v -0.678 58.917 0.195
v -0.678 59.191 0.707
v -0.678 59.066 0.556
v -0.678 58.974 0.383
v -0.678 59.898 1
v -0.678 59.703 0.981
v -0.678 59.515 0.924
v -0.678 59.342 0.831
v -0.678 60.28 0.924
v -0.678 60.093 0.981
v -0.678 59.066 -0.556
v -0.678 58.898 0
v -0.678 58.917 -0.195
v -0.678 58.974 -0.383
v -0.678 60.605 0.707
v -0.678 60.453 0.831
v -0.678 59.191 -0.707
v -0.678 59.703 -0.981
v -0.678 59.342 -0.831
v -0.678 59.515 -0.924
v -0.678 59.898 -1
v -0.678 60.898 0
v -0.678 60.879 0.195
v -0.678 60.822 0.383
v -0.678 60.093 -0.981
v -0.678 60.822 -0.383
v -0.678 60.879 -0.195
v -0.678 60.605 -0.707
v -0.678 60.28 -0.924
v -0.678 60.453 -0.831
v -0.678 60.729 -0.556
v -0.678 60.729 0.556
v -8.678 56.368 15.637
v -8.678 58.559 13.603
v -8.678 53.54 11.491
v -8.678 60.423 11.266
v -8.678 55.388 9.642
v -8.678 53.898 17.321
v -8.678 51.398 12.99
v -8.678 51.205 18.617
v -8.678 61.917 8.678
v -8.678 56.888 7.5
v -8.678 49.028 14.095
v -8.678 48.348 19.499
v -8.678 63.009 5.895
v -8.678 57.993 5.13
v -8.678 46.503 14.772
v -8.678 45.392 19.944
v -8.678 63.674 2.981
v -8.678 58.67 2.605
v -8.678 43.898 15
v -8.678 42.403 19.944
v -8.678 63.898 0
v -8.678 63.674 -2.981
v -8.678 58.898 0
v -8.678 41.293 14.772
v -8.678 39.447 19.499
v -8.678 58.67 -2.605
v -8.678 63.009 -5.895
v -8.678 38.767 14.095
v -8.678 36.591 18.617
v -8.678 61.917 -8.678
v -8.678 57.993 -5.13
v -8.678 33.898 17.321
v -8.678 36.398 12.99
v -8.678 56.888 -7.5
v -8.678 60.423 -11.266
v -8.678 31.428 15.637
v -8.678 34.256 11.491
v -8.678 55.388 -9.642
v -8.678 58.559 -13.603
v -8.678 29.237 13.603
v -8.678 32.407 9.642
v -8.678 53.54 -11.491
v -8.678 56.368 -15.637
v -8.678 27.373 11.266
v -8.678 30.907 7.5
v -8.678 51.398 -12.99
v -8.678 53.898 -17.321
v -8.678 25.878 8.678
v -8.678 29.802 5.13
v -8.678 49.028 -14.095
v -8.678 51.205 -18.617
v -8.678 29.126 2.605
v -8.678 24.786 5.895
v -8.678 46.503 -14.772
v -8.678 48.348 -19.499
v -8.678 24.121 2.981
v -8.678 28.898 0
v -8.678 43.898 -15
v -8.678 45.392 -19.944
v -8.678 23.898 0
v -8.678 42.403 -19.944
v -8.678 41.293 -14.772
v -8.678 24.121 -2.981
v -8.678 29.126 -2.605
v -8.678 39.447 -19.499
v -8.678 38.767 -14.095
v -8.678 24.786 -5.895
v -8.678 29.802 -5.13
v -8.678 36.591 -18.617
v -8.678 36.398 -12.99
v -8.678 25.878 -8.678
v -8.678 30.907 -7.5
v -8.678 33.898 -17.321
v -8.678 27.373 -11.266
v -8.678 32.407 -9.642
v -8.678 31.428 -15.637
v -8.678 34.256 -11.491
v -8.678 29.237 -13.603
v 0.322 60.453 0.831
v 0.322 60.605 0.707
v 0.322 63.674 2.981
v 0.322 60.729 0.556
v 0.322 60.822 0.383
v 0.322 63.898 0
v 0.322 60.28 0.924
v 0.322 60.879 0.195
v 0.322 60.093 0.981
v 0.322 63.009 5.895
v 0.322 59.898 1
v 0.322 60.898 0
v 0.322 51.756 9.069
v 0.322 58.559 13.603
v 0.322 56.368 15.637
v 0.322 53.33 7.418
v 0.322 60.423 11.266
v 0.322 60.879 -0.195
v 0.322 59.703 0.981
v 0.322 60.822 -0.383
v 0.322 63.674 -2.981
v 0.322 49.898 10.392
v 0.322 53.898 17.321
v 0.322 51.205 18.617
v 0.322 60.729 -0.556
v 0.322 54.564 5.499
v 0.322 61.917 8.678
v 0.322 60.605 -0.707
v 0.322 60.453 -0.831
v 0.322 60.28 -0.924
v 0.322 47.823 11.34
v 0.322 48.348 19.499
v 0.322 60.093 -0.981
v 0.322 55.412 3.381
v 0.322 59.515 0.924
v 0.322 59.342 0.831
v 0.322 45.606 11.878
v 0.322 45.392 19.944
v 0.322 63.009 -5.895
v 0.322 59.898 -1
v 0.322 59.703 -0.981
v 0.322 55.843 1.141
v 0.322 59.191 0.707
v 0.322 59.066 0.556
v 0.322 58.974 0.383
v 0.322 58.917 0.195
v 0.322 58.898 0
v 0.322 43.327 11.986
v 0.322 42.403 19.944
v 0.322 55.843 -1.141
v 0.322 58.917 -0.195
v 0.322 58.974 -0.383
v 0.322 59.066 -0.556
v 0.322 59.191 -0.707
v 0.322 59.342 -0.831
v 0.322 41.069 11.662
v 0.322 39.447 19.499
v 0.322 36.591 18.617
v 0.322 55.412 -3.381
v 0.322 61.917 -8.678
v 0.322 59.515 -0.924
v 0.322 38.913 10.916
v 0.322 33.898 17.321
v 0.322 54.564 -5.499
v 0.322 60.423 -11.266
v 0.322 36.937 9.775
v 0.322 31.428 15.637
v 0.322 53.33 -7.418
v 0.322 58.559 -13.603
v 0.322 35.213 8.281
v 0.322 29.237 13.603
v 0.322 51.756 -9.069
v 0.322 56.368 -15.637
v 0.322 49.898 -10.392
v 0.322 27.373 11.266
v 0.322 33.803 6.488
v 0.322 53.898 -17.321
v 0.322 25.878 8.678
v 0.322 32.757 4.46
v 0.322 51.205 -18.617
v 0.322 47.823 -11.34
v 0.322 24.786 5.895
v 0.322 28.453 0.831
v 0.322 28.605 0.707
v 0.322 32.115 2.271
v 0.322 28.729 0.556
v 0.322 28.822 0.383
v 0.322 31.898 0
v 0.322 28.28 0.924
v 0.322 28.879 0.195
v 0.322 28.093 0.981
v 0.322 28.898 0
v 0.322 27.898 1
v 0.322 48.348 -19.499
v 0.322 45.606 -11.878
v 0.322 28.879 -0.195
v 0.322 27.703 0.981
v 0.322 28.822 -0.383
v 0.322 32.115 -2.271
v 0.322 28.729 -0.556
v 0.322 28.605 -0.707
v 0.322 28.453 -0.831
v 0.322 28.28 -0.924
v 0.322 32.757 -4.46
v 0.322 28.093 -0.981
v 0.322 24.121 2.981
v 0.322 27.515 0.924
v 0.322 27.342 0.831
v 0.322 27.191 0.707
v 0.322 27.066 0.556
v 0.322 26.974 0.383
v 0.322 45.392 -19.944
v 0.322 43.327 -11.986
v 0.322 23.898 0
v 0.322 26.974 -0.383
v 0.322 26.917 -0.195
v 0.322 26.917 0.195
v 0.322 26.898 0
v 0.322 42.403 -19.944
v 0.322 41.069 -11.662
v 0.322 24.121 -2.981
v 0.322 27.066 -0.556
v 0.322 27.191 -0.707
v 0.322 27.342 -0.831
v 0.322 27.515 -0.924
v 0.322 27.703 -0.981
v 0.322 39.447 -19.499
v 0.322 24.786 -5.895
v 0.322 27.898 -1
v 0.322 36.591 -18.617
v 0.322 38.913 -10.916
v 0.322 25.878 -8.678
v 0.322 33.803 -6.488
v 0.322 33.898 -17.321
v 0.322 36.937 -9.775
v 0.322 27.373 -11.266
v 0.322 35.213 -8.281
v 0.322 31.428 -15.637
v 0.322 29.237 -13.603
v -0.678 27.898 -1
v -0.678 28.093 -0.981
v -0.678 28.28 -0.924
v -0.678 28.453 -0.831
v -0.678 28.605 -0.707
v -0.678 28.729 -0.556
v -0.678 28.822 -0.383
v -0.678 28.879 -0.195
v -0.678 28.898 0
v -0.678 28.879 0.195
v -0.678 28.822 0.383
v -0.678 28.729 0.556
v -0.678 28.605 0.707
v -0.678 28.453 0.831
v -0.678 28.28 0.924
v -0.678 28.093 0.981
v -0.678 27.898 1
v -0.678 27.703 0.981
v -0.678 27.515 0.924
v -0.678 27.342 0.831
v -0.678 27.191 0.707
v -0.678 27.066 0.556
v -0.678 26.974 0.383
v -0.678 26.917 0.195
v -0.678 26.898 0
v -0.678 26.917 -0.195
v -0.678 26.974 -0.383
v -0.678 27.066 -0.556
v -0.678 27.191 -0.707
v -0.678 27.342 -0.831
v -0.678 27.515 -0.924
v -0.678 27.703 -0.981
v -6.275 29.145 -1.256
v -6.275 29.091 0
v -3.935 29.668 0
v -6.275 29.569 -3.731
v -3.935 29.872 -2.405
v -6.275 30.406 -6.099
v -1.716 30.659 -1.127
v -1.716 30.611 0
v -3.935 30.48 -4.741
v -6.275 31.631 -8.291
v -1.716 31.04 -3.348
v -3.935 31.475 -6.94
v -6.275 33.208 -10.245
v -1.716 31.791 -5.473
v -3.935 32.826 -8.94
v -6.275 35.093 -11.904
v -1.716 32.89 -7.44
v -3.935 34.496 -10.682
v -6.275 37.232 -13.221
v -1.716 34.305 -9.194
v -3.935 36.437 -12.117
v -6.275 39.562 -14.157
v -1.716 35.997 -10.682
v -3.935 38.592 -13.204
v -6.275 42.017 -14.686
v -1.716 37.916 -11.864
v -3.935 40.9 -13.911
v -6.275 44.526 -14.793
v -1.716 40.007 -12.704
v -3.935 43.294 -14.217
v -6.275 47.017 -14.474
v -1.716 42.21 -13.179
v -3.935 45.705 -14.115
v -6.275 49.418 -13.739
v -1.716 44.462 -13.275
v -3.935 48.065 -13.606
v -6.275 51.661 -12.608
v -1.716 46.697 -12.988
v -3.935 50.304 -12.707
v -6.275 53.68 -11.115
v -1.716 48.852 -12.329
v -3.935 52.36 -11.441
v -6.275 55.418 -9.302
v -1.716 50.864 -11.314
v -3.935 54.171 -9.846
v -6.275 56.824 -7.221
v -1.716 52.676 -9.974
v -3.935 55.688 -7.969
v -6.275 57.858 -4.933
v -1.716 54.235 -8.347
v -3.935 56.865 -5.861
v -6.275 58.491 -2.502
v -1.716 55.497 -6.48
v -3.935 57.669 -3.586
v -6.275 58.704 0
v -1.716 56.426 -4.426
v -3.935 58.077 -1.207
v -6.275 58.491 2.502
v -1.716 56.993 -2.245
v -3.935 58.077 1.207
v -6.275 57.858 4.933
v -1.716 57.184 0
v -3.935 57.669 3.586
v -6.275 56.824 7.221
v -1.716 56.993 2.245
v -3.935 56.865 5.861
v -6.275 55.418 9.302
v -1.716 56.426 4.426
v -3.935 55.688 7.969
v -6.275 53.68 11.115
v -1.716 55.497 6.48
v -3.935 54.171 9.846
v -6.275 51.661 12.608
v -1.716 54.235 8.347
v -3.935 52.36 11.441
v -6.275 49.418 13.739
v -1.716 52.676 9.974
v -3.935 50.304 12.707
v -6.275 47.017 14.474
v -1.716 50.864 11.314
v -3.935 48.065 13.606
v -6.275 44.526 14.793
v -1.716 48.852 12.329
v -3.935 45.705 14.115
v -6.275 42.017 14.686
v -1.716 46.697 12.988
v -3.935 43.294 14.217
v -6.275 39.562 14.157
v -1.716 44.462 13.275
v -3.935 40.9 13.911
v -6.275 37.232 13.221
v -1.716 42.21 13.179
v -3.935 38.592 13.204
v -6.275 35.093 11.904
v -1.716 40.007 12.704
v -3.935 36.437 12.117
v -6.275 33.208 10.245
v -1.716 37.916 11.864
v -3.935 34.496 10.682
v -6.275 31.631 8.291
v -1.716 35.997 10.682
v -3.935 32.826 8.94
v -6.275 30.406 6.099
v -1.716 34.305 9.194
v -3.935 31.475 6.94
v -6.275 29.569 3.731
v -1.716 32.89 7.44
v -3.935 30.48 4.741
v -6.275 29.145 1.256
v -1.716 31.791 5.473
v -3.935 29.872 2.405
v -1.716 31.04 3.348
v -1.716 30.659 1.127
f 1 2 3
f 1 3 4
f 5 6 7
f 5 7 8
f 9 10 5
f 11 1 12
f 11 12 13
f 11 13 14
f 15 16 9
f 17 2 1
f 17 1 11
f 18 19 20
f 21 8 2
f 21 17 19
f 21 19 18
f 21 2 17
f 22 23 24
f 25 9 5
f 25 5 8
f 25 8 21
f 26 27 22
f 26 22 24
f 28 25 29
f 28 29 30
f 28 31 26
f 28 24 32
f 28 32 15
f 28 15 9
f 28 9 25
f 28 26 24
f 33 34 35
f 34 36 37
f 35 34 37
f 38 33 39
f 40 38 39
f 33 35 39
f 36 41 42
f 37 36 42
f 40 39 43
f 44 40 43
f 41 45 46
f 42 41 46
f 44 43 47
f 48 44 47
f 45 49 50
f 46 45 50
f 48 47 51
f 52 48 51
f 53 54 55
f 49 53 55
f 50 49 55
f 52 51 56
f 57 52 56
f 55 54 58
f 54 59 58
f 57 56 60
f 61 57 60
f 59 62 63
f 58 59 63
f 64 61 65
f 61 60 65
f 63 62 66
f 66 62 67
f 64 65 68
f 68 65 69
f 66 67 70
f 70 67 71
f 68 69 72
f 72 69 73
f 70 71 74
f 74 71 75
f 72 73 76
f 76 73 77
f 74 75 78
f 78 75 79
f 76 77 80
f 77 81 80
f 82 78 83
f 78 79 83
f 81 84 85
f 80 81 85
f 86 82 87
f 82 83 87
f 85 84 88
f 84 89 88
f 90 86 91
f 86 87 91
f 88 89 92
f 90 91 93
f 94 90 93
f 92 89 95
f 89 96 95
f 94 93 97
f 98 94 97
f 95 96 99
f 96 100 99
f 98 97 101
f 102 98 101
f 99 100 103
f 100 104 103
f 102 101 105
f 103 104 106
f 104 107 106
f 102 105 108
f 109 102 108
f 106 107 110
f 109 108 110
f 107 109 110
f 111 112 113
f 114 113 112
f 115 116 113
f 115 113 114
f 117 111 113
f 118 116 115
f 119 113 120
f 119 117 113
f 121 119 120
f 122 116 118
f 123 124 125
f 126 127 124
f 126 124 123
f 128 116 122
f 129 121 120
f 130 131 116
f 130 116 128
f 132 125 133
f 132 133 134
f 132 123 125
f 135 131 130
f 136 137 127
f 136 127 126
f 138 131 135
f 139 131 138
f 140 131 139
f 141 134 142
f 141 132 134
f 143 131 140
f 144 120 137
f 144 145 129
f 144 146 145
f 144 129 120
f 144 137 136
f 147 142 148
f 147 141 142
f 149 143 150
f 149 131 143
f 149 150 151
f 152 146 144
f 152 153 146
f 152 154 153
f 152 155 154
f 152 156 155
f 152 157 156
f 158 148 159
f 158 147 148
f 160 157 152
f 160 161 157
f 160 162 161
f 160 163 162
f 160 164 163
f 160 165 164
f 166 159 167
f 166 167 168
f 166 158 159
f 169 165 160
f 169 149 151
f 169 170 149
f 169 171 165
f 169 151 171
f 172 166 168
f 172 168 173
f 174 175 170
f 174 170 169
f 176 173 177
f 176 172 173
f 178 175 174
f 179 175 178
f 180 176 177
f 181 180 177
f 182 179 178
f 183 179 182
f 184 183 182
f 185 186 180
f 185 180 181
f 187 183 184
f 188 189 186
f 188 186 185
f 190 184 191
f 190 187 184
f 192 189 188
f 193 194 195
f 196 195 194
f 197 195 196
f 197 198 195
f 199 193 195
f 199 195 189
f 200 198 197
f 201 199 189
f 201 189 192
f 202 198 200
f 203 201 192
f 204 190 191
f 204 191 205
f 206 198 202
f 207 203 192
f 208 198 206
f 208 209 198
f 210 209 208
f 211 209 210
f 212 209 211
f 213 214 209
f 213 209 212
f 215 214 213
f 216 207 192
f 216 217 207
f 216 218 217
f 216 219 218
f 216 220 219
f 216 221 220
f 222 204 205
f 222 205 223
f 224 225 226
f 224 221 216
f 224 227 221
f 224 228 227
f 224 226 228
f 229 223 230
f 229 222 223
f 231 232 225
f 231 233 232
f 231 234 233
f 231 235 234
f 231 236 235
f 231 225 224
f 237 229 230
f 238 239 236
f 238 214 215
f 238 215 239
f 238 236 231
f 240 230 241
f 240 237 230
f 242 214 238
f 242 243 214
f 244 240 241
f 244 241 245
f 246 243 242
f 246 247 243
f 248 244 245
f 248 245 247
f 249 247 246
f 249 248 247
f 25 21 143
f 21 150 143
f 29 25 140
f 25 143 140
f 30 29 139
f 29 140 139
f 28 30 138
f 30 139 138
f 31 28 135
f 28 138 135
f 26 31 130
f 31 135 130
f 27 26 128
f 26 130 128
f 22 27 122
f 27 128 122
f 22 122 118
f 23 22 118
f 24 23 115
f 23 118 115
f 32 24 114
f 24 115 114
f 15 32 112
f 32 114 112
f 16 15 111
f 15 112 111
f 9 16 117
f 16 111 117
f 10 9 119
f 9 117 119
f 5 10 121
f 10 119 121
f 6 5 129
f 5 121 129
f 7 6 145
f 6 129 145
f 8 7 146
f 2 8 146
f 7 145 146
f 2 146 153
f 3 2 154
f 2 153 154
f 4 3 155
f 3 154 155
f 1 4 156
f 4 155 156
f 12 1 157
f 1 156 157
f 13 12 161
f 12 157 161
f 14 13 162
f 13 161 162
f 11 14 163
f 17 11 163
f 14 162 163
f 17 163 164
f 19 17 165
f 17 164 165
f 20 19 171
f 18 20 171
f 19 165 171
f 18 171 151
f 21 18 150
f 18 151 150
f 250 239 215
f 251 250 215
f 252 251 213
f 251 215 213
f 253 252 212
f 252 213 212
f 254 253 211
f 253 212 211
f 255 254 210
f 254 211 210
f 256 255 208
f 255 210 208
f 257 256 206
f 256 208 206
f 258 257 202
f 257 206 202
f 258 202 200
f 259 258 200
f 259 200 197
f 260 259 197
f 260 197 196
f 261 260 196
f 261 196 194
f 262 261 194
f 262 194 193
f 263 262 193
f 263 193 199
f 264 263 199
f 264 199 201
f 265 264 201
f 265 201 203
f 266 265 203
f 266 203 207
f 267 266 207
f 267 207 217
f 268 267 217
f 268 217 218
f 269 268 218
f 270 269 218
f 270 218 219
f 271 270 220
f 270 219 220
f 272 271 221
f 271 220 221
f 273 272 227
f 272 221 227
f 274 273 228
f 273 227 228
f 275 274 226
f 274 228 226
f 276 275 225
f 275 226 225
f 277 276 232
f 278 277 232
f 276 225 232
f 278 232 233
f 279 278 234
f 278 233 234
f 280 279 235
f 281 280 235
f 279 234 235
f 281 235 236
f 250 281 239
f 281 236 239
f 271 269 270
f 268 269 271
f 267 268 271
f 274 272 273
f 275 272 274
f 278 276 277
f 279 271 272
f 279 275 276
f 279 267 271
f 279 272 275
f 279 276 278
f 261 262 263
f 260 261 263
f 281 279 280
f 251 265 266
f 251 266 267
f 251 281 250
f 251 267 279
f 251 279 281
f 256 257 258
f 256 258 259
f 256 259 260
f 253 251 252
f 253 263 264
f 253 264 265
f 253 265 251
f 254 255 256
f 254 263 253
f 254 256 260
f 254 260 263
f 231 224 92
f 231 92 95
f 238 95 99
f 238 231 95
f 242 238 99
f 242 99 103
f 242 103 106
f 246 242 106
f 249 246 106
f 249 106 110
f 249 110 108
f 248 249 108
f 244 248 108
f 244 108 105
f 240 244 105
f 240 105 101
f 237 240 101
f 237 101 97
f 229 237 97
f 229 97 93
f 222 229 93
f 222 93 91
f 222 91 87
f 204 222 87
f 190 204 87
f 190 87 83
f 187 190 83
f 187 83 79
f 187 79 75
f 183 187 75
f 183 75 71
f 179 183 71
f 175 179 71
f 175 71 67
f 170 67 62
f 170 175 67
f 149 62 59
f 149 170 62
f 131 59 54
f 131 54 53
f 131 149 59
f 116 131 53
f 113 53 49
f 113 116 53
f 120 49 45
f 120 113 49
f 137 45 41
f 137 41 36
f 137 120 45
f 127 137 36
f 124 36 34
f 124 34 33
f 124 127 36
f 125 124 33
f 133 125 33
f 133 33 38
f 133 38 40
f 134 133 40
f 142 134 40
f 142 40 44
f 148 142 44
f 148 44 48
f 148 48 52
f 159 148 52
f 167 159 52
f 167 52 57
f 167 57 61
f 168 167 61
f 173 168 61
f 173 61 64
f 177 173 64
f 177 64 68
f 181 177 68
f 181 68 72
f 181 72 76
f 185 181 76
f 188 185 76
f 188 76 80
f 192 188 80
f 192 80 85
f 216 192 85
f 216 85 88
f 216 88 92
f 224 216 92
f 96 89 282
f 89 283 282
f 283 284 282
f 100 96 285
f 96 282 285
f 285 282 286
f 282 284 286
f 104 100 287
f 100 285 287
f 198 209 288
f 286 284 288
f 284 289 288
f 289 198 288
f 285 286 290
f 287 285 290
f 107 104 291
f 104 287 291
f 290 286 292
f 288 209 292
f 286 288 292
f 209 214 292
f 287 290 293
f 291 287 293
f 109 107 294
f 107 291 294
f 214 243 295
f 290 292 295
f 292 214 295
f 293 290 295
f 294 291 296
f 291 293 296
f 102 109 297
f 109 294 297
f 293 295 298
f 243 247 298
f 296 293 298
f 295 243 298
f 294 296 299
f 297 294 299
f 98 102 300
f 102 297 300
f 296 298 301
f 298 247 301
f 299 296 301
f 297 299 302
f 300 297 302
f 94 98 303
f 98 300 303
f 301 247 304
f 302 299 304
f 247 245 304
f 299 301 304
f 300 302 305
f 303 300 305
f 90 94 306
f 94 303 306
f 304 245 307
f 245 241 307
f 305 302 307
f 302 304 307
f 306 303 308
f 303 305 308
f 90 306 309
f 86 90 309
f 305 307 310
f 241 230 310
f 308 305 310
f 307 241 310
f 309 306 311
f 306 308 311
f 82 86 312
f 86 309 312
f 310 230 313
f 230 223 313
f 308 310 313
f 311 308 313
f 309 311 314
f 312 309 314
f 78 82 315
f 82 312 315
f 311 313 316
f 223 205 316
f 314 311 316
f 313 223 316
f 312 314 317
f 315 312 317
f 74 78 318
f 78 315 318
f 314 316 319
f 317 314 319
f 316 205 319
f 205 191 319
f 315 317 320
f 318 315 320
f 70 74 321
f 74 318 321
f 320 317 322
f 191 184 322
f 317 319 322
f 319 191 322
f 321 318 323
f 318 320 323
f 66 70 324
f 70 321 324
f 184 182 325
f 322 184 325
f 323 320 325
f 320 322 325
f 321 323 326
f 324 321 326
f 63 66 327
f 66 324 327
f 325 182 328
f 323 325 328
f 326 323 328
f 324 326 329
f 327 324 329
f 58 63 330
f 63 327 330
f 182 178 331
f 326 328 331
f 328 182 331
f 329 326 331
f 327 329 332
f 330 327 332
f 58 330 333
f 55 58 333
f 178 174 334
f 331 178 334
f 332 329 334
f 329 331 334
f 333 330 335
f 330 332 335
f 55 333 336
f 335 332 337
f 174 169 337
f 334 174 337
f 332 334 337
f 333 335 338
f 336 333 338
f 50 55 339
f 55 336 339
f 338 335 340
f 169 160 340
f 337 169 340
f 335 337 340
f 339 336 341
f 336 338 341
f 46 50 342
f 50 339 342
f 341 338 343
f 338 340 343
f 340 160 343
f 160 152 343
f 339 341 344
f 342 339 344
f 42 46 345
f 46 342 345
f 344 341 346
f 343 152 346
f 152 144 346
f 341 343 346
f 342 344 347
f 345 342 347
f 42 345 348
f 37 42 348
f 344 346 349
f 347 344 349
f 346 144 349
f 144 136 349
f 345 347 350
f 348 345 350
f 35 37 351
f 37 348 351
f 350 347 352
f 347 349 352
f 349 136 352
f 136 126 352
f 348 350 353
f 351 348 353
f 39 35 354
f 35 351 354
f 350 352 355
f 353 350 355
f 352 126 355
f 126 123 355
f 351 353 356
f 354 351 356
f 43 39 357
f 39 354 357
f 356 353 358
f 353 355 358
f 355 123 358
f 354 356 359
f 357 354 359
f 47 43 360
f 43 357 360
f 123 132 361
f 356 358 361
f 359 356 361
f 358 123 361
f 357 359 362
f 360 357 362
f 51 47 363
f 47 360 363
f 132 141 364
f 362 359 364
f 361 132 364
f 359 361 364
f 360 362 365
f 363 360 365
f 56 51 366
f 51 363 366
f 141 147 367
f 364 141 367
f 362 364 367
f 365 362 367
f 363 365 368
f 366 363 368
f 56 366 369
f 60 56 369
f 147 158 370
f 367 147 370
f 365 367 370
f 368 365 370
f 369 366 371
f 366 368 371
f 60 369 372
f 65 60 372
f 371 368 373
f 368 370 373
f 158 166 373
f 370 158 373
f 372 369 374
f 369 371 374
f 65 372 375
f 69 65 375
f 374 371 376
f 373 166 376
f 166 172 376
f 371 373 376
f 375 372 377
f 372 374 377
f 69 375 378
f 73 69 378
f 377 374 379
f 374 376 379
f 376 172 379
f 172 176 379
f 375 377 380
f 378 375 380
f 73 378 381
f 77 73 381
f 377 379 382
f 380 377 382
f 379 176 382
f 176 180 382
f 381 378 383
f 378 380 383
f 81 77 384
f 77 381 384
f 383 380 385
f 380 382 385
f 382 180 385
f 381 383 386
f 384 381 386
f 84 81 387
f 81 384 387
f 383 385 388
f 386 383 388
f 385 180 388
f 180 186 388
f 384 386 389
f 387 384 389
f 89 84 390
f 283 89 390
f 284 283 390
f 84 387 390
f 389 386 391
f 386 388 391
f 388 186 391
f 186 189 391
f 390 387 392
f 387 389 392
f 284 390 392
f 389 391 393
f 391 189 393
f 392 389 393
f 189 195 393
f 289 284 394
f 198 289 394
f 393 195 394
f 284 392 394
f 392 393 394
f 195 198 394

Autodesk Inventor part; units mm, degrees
ref_plane "YZ Plane" through (0, 0, 0) normal (1, 0, 0) x (0, 1, 0)
ref_plane "XZ Plane" through (0, 0, 0) normal (0, 1, 0) x (-1, 0, 0)
ref_plane "Work Plane1" through (0, 0, 0) normal (0, 0, 1) x (1, 0, 0)
sketch "Sketch1" plane through (0, 0, 0) normal (0, 0, 1) x (1, 0, 0)
  line L0 (-8.678, -58.5397) -> (-8.678, 43.8978) construction
  line L1 (1.322, -54.9064) -> (1.322, 43.8978) construction
  circle A0 centre (-8.678, 43.8978) radius 15 construction
  line L2 (-8.678, 23.8978) -> (1.322, 23.8978) construction
  line L3 (0.322, 23.8978) -> (0.322, 31.8978)
  line L4 (-8.678, 28.8978) -> (-8.678, 23.8978)
  line L5 (-8.678, 23.8978) -> (0.322, 23.8978)
  arc A1 (-8.678, 28.8978) -> (0.322, 31.8978) centre (-8.678, 43.8978) ccw
  line L6 (-8.678, 43.8978) -> (1.322, 43.8978) construction
  point P0 (0, 0)
  dimension "d0" = 1
revolve "Revolution1" add sketch "Sketch1" angle 360 about axis through (-8.678, 43.8978, 0) along (1, 0, 0)
thread "Thread2" size "M40x1.5" class "6g" standard "ISO Metric profile" length 9
sketch "Sketch9" plane through (0.322, 43.8978, 0) normal (1, 0, 0) x (0, 0, -1)
  circle A0 centre (0, 0) radius 12 construction
  circle A1 centre (0, 0) radius 20 construction
  circle A2 centre (0, 0) radius 16 construction
  line L0 (0, -56.6773) -> (0, 32.7796) construction
  circle A3 centre (0, -16) radius 1
  circle A4 centre (0, 16) radius 1
  point P0 (0, -43.8978)
  dimension "d49" = 4
  dimension "d50" = 8
  dimension "d51" = 2
  dimension "d52" = 2
extrude "Extrusion2" cut sketch "Sketch9" against normal blind 1
equation "\"d49\" = 0.5 * d50"
equation "\"d52\" = d51"
equation "\"d11\" = 55deg"
equation "\"Sketch2_Pitch\" = 1.5"
equation "\"d32\" = 55deg"
equation "\"Sketch5_Pitch\" = 1.5"
properties part number "MCEN4000:T6" material "STEEL, AISI 1040"
